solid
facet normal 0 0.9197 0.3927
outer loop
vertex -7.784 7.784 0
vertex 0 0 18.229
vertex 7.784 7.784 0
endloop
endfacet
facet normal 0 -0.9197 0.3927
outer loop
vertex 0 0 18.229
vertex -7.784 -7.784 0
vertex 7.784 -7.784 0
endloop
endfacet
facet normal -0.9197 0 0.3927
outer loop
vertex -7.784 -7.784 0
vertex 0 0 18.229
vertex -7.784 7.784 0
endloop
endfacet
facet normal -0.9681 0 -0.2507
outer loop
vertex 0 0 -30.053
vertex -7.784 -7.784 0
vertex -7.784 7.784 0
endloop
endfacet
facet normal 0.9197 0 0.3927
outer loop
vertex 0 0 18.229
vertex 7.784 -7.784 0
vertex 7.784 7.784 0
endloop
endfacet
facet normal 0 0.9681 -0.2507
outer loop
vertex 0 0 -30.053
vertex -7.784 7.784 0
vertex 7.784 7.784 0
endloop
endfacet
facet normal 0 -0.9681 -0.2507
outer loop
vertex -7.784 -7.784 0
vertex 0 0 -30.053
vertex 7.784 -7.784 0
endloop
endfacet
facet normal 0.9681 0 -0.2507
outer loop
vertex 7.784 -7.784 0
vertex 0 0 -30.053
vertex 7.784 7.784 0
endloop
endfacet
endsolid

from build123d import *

# Parameters (mm, degrees)
F3_DEPTH = 12.7
F4_DEPTH = 12.7
F5_ANGLE = 90


with BuildPart() as f3:
    # F0 (on Front) → F3 (new body, symmetric)
    with BuildSketch(Plane.XZ):
        Polygon((7.784226, 0), (0, 18.228879), (-7.784226, 0), (0, -30.053018), align=None)
    extrude(amount=F3_DEPTH, both=True)


with BuildPart() as f4:
    # F1 (on Front) → F4 (new body, symmetric)
    with BuildSketch(Plane.XZ):
        Polygon((-7.784226, 0), (0, -30.053018), (7.784226, 0), (0, 18.228879), align=None)
    extrude(amount=F4_DEPTH, both=True)


with BuildPart() as f3_1:
    # F5: moved
    add(f3.part.rotate(Axis((0, 0, -12.11974), (0, 0, -1)), F5_ANGLE))


with BuildPart() as f4_1:
    add(f4.part)

    # F6: intersect F3
    add(f3_1.part, mode=Mode.INTERSECT)


solid = f4_1.part
